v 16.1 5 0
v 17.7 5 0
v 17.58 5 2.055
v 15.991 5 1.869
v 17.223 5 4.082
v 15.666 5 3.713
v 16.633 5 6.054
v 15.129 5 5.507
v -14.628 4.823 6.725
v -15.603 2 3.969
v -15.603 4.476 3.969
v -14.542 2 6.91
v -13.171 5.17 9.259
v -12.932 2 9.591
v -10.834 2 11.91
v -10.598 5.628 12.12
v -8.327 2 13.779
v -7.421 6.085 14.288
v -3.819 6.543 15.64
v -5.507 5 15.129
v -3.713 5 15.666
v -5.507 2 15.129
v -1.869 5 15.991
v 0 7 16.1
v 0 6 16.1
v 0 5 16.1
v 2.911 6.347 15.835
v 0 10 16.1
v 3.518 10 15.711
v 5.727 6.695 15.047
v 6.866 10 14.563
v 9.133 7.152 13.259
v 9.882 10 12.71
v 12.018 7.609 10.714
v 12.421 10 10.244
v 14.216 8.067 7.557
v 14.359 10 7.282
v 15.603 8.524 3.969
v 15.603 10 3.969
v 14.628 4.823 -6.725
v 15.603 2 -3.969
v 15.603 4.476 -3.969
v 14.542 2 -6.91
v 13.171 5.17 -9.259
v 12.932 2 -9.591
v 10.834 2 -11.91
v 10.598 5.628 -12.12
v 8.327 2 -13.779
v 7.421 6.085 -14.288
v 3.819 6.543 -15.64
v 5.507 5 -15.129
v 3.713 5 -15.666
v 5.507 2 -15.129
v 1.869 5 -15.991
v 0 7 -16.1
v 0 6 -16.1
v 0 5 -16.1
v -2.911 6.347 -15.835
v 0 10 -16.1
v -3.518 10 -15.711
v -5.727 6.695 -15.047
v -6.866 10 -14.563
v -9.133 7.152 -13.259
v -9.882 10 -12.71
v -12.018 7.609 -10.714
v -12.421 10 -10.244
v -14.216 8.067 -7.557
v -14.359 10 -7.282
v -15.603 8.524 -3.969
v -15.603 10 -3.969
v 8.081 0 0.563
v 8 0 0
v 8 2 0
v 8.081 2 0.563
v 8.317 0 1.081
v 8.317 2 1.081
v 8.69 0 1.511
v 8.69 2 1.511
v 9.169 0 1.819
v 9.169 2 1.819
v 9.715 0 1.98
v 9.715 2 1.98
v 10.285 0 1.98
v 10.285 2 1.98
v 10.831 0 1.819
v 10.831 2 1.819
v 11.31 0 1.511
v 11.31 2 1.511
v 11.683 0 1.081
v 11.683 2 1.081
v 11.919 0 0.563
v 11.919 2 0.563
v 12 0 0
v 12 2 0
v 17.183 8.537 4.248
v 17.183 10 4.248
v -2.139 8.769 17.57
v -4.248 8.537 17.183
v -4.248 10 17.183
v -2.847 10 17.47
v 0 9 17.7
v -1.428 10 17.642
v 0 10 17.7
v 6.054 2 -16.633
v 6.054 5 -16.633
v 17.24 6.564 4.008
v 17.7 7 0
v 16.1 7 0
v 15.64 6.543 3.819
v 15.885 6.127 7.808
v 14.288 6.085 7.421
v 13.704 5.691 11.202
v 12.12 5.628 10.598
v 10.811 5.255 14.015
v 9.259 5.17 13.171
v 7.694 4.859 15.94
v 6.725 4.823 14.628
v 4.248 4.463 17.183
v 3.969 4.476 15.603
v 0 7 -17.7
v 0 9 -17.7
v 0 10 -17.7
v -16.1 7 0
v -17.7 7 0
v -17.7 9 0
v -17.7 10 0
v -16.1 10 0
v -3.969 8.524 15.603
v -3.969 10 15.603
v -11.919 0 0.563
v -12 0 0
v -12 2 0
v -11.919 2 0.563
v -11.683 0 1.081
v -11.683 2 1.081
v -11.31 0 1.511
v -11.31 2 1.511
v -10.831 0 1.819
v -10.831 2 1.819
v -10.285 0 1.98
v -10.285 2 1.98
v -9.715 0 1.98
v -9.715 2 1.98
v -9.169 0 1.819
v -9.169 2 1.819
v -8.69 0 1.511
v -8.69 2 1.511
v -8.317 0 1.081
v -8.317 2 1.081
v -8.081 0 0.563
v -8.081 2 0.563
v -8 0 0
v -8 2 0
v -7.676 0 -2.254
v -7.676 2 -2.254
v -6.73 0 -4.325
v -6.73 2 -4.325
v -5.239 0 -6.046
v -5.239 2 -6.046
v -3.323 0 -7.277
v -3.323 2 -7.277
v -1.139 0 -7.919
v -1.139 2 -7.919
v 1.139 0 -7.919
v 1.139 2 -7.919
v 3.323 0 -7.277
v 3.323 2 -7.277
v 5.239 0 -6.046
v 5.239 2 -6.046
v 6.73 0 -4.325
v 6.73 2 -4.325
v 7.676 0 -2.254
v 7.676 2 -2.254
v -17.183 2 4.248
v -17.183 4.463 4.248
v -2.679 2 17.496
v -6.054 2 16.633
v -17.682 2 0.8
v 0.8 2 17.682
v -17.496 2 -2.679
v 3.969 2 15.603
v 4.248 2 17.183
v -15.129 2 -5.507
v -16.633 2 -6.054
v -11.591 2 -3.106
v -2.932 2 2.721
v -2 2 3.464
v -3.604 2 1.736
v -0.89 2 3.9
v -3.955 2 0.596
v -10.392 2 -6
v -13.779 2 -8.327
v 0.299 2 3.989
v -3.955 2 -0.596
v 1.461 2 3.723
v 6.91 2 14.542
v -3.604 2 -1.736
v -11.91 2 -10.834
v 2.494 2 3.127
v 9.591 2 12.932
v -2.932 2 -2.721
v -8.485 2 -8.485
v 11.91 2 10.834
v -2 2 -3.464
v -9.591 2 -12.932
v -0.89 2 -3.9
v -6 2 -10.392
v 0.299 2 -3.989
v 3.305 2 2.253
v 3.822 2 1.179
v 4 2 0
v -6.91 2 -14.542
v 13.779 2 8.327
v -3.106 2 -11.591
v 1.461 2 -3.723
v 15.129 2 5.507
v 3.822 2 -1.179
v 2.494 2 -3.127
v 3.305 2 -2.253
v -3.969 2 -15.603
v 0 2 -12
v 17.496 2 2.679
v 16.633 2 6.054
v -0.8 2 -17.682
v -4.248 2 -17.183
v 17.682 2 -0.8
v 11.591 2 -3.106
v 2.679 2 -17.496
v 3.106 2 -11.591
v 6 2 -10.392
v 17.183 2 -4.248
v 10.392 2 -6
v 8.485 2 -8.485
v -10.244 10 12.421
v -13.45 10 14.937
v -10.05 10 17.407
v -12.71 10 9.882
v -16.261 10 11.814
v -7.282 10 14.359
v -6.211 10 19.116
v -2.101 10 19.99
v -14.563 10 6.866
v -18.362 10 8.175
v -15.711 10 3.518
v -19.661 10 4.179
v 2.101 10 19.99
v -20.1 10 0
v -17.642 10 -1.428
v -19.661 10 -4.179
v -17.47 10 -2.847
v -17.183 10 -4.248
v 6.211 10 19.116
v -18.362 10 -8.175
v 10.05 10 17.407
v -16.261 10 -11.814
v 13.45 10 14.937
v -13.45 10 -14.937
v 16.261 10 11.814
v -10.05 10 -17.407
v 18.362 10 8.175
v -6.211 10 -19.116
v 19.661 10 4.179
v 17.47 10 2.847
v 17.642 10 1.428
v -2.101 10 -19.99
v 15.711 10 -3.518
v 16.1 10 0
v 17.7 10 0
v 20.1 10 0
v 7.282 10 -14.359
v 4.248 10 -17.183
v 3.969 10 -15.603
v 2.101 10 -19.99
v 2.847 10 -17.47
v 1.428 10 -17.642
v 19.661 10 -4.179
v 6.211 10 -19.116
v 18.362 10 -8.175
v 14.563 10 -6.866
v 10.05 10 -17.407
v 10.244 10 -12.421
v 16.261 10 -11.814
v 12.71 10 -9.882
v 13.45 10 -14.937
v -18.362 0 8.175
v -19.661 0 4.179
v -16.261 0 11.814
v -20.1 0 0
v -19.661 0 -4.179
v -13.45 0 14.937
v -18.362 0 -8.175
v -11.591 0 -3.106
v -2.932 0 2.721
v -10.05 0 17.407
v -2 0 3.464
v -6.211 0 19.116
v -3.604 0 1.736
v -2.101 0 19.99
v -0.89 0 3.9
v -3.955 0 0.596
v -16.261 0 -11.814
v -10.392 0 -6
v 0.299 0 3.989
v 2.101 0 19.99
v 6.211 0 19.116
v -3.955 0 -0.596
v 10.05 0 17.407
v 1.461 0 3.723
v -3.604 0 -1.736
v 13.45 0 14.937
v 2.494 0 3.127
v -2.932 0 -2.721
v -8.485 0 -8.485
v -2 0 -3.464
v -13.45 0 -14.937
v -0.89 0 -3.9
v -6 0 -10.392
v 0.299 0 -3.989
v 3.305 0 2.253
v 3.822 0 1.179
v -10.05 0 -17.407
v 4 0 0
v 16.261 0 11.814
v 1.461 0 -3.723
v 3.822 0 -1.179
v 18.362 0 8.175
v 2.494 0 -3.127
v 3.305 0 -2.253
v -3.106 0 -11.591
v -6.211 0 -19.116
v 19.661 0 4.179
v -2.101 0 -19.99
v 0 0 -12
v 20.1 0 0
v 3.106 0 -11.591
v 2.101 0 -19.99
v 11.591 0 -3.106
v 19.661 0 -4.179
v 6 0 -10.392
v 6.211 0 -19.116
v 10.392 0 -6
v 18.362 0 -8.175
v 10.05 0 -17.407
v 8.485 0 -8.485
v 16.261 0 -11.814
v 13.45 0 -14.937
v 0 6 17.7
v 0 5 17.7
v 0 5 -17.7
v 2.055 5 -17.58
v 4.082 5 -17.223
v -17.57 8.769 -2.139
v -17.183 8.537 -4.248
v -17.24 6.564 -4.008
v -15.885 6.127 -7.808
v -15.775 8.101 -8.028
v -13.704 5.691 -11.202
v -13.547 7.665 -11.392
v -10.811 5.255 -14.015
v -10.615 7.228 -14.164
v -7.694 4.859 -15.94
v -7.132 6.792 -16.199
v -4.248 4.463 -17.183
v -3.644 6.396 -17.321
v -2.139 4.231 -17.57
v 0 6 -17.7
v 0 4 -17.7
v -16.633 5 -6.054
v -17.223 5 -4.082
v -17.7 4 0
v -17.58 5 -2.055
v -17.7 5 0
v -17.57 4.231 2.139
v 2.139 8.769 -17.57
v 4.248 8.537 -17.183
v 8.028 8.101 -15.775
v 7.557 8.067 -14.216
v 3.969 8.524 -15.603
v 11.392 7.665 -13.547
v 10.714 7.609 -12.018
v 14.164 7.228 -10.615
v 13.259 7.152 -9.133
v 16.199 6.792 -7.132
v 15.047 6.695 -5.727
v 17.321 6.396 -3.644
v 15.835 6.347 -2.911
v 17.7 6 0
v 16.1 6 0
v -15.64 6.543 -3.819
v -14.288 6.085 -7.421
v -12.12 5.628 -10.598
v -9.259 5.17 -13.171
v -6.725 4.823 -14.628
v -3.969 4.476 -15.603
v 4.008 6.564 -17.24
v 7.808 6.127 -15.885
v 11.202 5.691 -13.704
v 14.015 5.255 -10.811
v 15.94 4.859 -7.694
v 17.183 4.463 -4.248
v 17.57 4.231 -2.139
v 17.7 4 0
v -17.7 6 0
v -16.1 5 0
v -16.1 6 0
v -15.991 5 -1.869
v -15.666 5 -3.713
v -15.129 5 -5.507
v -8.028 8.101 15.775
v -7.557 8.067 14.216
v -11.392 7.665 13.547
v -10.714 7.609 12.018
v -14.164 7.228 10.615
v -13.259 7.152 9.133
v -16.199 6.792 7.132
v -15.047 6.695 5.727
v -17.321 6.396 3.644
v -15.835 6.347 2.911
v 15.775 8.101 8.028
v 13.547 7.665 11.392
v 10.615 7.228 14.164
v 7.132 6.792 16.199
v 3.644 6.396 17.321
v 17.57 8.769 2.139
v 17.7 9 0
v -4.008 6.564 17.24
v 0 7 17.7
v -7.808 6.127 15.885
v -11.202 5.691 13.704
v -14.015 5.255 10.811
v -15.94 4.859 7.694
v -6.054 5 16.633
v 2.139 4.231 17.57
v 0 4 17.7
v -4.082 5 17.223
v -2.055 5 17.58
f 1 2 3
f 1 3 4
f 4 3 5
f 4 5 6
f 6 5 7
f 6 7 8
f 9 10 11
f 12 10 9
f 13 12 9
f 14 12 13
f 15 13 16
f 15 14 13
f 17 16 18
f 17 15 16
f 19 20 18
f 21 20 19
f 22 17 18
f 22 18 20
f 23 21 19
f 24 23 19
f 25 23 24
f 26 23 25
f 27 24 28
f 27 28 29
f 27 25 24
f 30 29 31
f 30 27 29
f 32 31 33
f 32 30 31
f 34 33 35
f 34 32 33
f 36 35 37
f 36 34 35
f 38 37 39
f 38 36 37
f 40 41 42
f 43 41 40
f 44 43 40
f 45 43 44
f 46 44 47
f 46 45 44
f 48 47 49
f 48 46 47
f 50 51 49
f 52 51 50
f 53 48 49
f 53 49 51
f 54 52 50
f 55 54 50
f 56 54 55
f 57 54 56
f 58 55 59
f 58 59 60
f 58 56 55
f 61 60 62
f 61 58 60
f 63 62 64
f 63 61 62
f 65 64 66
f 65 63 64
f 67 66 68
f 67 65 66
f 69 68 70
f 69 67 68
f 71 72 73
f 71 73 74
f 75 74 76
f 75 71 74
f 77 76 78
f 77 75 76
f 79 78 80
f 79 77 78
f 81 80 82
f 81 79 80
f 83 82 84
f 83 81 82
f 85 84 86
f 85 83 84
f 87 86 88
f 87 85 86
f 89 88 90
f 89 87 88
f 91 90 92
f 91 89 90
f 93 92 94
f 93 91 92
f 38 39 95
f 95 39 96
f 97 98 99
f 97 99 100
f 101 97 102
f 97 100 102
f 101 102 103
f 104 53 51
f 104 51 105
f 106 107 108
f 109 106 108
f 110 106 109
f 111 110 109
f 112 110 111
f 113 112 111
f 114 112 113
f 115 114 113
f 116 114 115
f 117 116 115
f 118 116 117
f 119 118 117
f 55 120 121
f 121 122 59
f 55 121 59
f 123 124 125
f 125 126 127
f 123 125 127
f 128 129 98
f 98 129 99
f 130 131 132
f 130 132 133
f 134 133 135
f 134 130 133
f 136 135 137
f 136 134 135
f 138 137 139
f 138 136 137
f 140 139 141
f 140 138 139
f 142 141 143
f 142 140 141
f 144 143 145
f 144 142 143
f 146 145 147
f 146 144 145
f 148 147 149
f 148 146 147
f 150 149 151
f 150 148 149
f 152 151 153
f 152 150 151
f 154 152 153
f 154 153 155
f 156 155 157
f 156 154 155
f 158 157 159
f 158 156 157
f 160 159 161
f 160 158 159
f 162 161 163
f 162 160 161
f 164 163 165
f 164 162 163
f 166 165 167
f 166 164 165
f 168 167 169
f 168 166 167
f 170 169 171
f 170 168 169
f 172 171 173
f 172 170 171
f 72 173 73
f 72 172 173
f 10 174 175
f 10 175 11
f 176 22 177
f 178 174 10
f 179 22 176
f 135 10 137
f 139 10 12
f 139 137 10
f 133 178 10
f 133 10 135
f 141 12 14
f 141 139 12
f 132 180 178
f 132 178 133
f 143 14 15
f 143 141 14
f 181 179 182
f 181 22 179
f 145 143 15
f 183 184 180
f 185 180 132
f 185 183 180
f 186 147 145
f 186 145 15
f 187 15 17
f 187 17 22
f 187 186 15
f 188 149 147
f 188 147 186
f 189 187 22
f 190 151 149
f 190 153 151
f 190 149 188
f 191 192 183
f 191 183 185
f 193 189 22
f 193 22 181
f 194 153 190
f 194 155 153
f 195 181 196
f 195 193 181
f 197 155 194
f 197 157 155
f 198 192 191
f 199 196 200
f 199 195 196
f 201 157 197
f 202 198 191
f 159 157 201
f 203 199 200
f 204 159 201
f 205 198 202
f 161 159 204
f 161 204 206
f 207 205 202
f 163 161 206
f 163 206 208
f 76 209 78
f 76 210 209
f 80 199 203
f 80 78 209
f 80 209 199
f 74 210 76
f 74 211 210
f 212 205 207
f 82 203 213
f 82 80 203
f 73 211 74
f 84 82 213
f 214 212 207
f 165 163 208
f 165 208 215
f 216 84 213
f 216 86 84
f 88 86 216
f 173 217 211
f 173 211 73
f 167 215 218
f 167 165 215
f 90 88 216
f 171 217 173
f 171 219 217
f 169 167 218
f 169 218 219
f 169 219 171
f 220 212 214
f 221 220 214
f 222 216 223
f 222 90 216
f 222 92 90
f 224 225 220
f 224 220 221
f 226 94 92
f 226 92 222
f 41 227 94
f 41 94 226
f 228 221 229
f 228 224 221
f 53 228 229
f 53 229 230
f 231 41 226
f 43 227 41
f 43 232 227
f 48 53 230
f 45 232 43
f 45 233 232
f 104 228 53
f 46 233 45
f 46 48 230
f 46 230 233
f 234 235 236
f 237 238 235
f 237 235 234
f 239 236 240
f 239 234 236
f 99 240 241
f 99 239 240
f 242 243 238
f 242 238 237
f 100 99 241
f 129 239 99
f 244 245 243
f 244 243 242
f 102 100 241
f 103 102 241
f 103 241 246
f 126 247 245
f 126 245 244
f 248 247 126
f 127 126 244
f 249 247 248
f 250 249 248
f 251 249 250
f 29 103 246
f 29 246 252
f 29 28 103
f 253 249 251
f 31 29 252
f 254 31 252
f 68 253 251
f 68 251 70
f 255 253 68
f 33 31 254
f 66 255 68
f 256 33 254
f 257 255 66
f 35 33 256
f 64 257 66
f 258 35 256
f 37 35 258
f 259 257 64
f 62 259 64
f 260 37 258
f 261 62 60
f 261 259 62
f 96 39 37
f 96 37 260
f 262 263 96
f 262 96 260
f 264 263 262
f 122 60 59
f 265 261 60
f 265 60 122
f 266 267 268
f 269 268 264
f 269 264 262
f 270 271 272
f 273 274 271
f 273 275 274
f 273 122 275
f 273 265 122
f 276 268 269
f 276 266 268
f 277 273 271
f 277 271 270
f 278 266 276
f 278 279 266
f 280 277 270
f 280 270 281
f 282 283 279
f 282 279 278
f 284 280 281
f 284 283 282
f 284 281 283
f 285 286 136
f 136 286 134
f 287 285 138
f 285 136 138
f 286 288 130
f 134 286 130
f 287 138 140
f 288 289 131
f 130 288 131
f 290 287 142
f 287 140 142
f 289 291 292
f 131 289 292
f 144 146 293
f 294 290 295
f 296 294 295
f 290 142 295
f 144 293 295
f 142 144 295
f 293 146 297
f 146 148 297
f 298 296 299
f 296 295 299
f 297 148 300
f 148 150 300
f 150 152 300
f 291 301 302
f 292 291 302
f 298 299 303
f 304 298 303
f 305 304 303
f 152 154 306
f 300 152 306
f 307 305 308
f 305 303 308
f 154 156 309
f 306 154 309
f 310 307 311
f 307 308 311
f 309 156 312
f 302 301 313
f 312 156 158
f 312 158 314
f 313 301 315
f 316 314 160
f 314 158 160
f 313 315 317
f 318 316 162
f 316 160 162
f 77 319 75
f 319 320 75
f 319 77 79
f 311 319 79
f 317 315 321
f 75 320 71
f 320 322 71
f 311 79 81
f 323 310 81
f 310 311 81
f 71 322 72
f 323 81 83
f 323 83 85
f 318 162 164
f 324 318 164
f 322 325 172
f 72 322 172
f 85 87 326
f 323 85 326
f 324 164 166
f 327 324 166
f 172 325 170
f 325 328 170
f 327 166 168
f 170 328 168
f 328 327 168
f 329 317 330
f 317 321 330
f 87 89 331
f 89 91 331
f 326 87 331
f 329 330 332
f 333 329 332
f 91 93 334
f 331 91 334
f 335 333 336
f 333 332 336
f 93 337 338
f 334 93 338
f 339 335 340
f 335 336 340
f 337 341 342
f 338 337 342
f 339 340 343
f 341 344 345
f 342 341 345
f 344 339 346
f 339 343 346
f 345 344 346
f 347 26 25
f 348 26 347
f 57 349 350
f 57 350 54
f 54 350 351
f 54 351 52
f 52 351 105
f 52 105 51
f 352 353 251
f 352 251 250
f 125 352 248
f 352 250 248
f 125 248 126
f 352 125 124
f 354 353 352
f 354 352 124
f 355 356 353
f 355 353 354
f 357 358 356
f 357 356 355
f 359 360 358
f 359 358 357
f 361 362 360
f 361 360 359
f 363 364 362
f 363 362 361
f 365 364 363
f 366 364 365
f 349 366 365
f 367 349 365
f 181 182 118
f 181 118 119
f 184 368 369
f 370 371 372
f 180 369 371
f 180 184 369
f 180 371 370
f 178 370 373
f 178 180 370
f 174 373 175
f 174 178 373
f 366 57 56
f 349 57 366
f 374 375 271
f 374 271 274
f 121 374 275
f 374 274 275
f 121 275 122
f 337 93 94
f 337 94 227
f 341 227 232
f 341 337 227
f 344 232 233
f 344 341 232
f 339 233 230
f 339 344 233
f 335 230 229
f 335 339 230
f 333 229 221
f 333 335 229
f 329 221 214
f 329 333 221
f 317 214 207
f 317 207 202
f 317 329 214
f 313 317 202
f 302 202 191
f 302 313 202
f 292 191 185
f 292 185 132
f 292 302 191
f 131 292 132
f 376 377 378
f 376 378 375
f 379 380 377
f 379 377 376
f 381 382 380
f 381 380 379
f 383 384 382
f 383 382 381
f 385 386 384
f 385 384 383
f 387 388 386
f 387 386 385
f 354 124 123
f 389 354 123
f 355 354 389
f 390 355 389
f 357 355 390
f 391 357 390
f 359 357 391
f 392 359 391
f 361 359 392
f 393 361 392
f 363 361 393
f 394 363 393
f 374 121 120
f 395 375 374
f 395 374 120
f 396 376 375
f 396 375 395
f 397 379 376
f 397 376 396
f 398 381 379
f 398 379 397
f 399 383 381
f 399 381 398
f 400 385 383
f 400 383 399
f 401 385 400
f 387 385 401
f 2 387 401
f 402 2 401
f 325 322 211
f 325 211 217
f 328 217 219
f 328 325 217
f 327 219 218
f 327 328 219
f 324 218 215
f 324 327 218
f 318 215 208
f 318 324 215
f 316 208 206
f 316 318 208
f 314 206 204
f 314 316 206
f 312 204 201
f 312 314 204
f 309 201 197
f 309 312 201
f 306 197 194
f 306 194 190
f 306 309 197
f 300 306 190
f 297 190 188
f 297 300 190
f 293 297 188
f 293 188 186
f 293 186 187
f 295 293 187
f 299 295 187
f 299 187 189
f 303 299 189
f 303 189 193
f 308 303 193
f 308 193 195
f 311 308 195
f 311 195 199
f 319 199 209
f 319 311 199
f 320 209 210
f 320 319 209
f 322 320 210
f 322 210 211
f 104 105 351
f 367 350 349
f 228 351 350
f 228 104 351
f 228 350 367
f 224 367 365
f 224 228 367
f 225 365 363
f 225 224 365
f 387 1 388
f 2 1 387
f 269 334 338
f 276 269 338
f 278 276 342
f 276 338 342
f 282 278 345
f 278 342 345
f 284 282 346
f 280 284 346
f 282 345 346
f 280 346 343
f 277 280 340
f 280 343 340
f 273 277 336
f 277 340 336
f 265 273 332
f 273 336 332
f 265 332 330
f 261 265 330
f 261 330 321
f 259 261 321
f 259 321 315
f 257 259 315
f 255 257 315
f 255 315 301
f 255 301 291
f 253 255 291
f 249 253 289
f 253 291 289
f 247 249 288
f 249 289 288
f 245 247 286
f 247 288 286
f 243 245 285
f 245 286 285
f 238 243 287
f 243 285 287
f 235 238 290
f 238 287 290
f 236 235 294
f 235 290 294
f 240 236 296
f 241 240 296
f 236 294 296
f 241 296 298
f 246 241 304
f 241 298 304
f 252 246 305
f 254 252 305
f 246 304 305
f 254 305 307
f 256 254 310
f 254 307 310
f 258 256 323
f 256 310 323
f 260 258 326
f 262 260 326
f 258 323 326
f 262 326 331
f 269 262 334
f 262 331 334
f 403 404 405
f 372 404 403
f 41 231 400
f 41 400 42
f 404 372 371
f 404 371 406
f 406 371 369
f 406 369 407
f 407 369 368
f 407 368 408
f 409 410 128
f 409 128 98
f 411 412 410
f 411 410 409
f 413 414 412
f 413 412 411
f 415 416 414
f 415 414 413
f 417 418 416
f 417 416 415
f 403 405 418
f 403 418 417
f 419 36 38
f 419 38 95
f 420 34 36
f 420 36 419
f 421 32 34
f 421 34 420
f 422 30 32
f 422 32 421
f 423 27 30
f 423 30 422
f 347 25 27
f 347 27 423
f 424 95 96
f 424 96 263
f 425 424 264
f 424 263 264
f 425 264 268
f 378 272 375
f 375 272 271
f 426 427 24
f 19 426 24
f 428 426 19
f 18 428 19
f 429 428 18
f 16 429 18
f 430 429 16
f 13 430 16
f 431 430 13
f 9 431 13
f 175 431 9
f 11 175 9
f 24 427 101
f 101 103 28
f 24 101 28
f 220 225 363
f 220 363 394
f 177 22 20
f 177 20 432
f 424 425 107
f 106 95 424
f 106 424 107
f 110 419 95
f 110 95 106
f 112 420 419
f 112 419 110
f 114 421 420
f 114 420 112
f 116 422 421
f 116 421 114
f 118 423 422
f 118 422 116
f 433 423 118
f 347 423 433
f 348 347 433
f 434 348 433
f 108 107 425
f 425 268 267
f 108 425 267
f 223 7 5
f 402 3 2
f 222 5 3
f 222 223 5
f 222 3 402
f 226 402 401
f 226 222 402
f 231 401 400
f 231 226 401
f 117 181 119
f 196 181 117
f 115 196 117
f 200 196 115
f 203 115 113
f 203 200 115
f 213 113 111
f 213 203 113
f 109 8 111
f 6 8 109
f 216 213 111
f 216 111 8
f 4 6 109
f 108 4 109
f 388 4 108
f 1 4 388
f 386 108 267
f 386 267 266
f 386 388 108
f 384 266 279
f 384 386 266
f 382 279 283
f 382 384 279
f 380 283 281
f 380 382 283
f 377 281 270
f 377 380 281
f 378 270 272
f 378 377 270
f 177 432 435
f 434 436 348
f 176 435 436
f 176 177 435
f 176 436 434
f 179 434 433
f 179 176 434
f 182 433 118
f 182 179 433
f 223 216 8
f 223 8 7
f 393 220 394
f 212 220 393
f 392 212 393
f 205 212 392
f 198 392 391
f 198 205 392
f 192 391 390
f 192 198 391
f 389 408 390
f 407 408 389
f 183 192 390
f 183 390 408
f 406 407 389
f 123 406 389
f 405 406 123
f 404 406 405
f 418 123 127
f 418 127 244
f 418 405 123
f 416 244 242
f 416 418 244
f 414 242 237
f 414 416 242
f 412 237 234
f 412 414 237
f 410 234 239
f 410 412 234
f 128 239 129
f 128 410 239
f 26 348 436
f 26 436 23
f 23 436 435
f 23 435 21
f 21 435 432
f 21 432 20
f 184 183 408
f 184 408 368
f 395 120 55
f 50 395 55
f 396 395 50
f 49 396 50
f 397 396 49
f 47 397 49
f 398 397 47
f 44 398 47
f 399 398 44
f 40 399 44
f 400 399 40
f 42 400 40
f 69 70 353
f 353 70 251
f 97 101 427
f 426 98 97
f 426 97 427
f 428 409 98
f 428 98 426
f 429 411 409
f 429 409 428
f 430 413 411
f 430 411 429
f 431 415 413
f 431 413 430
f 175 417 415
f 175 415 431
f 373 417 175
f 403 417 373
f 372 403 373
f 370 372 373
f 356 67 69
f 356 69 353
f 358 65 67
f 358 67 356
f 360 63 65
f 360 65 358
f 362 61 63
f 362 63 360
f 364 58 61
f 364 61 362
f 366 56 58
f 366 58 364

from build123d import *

# Parameters (mm, degrees)
SKETCH1_R              = 16.1
SKETCH1_R_2            = 4
BOSS_EXTRUDE1_DEPTH    = 2
SKETCH2_R              = 20.1
SKETCH2_R_2            = 16.1
BOSS_EXTRUDE2_DEPTH    = 10
CUT_SWEEP2_PITCH       = 12
CUT_SWEEP2_HEIGHT      = 3
CUT_SWEEP2_RADIUS      = 16.1
CUT_SWEEP2_START_ANGLE = -90
SKETCH35_W             = 3.2
SKETCH35_H             = 2
CIRPATTERN3_COUNT      = 4
CUT_EXTRUDE1_DEPTH     = 2
CIRPATTERN4_COUNT      = 4
CUT_EXTRUDE4_DEPTH     = 3
CIRPATTERN5_COUNT      = 4


with BuildPart() as part:
    # Sketch1 → Boss-Extrude1 (new body)
    with BuildSketch(Plane(origin=(0, 0, 0), x_dir=(1, 0, 0), z_dir=(0, 1, 0))):
        Circle(SKETCH1_R)
        Circle(SKETCH1_R_2, mode=Mode.SUBTRACT)
        with BuildLine():
            ThreePointArc((12, 0), (0, 12), (-12, 0))
            ThreePointArc((-12, 0), (-10, -2), (-8, 0))
            ThreePointArc((-8, 0), (0, 8), (8, 0))
            ThreePointArc((8, 0), (10, -2), (12, 0))
        make_face(mode=Mode.SUBTRACT)
    extrude(amount=BOSS_EXTRUDE1_DEPTH)

    # Sketch2 → Boss-Extrude2 (add)
    with BuildSketch(Plane(origin=(0, 0, 0), x_dir=(1, 0, 0), z_dir=(0, 1, 0))):
        Circle(SKETCH2_R)
        Circle(SKETCH2_R_2, mode=Mode.SUBTRACT)
    extrude(amount=BOSS_EXTRUDE2_DEPTH)

    # Cut-Sweep2: sweep along a helix
    with BuildLine() as cut_sweep2_path:
        add(Helix(CUT_SWEEP2_PITCH, CUT_SWEEP2_HEIGHT, CUT_SWEEP2_RADIUS, center=(0, 8, 0), direction=(0, -1, 0), mode=Mode.PRIVATE).rotate(Axis((0, 8, 0), (0, -1, 0)), CUT_SWEEP2_START_ANGLE))
    # Sketch35 → Cut-Sweep2 (sweep, cut)
    with BuildSketch(Plane.XY):
        with Locations((-16.1, 8)):
            Rectangle(SKETCH35_W, SKETCH35_H)
    cut_sweep2 = sweep(path=cut_sweep2_path.line, is_frenet=True, mode=Mode.SUBTRACT)

    # CirPattern3: Cut-Sweep2 ×4 about axis
    cirpattern3_axis = Axis((0, 2, 0), (0, -1, 0))
    for i in range(1, CIRPATTERN3_COUNT):
        add(cut_sweep2.rotate(cirpattern3_axis, i * 360 / CIRPATTERN3_COUNT), mode=Mode.SUBTRACT)

    # Sketch36 → Cut-Extrude1 (cut)
    with BuildSketch(Plane(origin=(0, 10, 0), x_dir=(1, 0, 0), z_dir=(0, 1, 0))):
        with BuildLine():
            Line((-17.7, 0), (-16.1, 0))
            ThreePointArc((-16.1, 0), (-15.975293425, 2), (-15.60310559, 3.969017))
            Line((-15.60310559, 3.969017), (-17.182789415, 4.247557879))
            ThreePointArc((-17.182789415, 4.247557879), (-17.570221579, 2.139465747), (-17.7, 0))
        make_face()
    cut_extrude1 = extrude(amount=-CUT_EXTRUDE1_DEPTH, mode=Mode.SUBTRACT)

    # CirPattern4: Cut-Extrude1 ×4 about axis
    cirpattern4_axis = Axis((0, 0, 0), (0, 1, 0))
    for i in range(1, CIRPATTERN4_COUNT):
        add(cut_extrude1.rotate(cirpattern4_axis, i * 360 / CIRPATTERN4_COUNT), mode=Mode.SUBTRACT)

    # Sketch37 → Cut-Extrude4 (cut)
    with BuildSketch(Plane(origin=(0, 2, 0), x_dir=(1, 0, 0), z_dir=(0, 1, 0))):
        with BuildLine():
            Line((-15.129051195, 5.506524308), (-16.632559388, 6.053756537))
            ThreePointArc((-16.632559388, 6.053756537), (-17.674804761, 0.944074504), (-17.182789415, -4.247557879))
            Line((-17.182789415, -4.247557879), (-15.60310559, -3.969017))
            ThreePointArc((-15.60310559, -3.969017), (-16.079889176, 0.804465085), (-15.129051195, 5.506524308))
        make_face()
    cut_extrude4 = extrude(amount=CUT_EXTRUDE4_DEPTH, mode=Mode.SUBTRACT)

    # CirPattern5: Cut-Extrude4 ×4 about axis
    cirpattern5_axis = Axis((0, 0, 0), (0, 1, 0))
    for i in range(1, CIRPATTERN5_COUNT):
        add(cut_extrude4.rotate(cirpattern5_axis, i * 360 / CIRPATTERN5_COUNT), mode=Mode.SUBTRACT)


solid = part.part
